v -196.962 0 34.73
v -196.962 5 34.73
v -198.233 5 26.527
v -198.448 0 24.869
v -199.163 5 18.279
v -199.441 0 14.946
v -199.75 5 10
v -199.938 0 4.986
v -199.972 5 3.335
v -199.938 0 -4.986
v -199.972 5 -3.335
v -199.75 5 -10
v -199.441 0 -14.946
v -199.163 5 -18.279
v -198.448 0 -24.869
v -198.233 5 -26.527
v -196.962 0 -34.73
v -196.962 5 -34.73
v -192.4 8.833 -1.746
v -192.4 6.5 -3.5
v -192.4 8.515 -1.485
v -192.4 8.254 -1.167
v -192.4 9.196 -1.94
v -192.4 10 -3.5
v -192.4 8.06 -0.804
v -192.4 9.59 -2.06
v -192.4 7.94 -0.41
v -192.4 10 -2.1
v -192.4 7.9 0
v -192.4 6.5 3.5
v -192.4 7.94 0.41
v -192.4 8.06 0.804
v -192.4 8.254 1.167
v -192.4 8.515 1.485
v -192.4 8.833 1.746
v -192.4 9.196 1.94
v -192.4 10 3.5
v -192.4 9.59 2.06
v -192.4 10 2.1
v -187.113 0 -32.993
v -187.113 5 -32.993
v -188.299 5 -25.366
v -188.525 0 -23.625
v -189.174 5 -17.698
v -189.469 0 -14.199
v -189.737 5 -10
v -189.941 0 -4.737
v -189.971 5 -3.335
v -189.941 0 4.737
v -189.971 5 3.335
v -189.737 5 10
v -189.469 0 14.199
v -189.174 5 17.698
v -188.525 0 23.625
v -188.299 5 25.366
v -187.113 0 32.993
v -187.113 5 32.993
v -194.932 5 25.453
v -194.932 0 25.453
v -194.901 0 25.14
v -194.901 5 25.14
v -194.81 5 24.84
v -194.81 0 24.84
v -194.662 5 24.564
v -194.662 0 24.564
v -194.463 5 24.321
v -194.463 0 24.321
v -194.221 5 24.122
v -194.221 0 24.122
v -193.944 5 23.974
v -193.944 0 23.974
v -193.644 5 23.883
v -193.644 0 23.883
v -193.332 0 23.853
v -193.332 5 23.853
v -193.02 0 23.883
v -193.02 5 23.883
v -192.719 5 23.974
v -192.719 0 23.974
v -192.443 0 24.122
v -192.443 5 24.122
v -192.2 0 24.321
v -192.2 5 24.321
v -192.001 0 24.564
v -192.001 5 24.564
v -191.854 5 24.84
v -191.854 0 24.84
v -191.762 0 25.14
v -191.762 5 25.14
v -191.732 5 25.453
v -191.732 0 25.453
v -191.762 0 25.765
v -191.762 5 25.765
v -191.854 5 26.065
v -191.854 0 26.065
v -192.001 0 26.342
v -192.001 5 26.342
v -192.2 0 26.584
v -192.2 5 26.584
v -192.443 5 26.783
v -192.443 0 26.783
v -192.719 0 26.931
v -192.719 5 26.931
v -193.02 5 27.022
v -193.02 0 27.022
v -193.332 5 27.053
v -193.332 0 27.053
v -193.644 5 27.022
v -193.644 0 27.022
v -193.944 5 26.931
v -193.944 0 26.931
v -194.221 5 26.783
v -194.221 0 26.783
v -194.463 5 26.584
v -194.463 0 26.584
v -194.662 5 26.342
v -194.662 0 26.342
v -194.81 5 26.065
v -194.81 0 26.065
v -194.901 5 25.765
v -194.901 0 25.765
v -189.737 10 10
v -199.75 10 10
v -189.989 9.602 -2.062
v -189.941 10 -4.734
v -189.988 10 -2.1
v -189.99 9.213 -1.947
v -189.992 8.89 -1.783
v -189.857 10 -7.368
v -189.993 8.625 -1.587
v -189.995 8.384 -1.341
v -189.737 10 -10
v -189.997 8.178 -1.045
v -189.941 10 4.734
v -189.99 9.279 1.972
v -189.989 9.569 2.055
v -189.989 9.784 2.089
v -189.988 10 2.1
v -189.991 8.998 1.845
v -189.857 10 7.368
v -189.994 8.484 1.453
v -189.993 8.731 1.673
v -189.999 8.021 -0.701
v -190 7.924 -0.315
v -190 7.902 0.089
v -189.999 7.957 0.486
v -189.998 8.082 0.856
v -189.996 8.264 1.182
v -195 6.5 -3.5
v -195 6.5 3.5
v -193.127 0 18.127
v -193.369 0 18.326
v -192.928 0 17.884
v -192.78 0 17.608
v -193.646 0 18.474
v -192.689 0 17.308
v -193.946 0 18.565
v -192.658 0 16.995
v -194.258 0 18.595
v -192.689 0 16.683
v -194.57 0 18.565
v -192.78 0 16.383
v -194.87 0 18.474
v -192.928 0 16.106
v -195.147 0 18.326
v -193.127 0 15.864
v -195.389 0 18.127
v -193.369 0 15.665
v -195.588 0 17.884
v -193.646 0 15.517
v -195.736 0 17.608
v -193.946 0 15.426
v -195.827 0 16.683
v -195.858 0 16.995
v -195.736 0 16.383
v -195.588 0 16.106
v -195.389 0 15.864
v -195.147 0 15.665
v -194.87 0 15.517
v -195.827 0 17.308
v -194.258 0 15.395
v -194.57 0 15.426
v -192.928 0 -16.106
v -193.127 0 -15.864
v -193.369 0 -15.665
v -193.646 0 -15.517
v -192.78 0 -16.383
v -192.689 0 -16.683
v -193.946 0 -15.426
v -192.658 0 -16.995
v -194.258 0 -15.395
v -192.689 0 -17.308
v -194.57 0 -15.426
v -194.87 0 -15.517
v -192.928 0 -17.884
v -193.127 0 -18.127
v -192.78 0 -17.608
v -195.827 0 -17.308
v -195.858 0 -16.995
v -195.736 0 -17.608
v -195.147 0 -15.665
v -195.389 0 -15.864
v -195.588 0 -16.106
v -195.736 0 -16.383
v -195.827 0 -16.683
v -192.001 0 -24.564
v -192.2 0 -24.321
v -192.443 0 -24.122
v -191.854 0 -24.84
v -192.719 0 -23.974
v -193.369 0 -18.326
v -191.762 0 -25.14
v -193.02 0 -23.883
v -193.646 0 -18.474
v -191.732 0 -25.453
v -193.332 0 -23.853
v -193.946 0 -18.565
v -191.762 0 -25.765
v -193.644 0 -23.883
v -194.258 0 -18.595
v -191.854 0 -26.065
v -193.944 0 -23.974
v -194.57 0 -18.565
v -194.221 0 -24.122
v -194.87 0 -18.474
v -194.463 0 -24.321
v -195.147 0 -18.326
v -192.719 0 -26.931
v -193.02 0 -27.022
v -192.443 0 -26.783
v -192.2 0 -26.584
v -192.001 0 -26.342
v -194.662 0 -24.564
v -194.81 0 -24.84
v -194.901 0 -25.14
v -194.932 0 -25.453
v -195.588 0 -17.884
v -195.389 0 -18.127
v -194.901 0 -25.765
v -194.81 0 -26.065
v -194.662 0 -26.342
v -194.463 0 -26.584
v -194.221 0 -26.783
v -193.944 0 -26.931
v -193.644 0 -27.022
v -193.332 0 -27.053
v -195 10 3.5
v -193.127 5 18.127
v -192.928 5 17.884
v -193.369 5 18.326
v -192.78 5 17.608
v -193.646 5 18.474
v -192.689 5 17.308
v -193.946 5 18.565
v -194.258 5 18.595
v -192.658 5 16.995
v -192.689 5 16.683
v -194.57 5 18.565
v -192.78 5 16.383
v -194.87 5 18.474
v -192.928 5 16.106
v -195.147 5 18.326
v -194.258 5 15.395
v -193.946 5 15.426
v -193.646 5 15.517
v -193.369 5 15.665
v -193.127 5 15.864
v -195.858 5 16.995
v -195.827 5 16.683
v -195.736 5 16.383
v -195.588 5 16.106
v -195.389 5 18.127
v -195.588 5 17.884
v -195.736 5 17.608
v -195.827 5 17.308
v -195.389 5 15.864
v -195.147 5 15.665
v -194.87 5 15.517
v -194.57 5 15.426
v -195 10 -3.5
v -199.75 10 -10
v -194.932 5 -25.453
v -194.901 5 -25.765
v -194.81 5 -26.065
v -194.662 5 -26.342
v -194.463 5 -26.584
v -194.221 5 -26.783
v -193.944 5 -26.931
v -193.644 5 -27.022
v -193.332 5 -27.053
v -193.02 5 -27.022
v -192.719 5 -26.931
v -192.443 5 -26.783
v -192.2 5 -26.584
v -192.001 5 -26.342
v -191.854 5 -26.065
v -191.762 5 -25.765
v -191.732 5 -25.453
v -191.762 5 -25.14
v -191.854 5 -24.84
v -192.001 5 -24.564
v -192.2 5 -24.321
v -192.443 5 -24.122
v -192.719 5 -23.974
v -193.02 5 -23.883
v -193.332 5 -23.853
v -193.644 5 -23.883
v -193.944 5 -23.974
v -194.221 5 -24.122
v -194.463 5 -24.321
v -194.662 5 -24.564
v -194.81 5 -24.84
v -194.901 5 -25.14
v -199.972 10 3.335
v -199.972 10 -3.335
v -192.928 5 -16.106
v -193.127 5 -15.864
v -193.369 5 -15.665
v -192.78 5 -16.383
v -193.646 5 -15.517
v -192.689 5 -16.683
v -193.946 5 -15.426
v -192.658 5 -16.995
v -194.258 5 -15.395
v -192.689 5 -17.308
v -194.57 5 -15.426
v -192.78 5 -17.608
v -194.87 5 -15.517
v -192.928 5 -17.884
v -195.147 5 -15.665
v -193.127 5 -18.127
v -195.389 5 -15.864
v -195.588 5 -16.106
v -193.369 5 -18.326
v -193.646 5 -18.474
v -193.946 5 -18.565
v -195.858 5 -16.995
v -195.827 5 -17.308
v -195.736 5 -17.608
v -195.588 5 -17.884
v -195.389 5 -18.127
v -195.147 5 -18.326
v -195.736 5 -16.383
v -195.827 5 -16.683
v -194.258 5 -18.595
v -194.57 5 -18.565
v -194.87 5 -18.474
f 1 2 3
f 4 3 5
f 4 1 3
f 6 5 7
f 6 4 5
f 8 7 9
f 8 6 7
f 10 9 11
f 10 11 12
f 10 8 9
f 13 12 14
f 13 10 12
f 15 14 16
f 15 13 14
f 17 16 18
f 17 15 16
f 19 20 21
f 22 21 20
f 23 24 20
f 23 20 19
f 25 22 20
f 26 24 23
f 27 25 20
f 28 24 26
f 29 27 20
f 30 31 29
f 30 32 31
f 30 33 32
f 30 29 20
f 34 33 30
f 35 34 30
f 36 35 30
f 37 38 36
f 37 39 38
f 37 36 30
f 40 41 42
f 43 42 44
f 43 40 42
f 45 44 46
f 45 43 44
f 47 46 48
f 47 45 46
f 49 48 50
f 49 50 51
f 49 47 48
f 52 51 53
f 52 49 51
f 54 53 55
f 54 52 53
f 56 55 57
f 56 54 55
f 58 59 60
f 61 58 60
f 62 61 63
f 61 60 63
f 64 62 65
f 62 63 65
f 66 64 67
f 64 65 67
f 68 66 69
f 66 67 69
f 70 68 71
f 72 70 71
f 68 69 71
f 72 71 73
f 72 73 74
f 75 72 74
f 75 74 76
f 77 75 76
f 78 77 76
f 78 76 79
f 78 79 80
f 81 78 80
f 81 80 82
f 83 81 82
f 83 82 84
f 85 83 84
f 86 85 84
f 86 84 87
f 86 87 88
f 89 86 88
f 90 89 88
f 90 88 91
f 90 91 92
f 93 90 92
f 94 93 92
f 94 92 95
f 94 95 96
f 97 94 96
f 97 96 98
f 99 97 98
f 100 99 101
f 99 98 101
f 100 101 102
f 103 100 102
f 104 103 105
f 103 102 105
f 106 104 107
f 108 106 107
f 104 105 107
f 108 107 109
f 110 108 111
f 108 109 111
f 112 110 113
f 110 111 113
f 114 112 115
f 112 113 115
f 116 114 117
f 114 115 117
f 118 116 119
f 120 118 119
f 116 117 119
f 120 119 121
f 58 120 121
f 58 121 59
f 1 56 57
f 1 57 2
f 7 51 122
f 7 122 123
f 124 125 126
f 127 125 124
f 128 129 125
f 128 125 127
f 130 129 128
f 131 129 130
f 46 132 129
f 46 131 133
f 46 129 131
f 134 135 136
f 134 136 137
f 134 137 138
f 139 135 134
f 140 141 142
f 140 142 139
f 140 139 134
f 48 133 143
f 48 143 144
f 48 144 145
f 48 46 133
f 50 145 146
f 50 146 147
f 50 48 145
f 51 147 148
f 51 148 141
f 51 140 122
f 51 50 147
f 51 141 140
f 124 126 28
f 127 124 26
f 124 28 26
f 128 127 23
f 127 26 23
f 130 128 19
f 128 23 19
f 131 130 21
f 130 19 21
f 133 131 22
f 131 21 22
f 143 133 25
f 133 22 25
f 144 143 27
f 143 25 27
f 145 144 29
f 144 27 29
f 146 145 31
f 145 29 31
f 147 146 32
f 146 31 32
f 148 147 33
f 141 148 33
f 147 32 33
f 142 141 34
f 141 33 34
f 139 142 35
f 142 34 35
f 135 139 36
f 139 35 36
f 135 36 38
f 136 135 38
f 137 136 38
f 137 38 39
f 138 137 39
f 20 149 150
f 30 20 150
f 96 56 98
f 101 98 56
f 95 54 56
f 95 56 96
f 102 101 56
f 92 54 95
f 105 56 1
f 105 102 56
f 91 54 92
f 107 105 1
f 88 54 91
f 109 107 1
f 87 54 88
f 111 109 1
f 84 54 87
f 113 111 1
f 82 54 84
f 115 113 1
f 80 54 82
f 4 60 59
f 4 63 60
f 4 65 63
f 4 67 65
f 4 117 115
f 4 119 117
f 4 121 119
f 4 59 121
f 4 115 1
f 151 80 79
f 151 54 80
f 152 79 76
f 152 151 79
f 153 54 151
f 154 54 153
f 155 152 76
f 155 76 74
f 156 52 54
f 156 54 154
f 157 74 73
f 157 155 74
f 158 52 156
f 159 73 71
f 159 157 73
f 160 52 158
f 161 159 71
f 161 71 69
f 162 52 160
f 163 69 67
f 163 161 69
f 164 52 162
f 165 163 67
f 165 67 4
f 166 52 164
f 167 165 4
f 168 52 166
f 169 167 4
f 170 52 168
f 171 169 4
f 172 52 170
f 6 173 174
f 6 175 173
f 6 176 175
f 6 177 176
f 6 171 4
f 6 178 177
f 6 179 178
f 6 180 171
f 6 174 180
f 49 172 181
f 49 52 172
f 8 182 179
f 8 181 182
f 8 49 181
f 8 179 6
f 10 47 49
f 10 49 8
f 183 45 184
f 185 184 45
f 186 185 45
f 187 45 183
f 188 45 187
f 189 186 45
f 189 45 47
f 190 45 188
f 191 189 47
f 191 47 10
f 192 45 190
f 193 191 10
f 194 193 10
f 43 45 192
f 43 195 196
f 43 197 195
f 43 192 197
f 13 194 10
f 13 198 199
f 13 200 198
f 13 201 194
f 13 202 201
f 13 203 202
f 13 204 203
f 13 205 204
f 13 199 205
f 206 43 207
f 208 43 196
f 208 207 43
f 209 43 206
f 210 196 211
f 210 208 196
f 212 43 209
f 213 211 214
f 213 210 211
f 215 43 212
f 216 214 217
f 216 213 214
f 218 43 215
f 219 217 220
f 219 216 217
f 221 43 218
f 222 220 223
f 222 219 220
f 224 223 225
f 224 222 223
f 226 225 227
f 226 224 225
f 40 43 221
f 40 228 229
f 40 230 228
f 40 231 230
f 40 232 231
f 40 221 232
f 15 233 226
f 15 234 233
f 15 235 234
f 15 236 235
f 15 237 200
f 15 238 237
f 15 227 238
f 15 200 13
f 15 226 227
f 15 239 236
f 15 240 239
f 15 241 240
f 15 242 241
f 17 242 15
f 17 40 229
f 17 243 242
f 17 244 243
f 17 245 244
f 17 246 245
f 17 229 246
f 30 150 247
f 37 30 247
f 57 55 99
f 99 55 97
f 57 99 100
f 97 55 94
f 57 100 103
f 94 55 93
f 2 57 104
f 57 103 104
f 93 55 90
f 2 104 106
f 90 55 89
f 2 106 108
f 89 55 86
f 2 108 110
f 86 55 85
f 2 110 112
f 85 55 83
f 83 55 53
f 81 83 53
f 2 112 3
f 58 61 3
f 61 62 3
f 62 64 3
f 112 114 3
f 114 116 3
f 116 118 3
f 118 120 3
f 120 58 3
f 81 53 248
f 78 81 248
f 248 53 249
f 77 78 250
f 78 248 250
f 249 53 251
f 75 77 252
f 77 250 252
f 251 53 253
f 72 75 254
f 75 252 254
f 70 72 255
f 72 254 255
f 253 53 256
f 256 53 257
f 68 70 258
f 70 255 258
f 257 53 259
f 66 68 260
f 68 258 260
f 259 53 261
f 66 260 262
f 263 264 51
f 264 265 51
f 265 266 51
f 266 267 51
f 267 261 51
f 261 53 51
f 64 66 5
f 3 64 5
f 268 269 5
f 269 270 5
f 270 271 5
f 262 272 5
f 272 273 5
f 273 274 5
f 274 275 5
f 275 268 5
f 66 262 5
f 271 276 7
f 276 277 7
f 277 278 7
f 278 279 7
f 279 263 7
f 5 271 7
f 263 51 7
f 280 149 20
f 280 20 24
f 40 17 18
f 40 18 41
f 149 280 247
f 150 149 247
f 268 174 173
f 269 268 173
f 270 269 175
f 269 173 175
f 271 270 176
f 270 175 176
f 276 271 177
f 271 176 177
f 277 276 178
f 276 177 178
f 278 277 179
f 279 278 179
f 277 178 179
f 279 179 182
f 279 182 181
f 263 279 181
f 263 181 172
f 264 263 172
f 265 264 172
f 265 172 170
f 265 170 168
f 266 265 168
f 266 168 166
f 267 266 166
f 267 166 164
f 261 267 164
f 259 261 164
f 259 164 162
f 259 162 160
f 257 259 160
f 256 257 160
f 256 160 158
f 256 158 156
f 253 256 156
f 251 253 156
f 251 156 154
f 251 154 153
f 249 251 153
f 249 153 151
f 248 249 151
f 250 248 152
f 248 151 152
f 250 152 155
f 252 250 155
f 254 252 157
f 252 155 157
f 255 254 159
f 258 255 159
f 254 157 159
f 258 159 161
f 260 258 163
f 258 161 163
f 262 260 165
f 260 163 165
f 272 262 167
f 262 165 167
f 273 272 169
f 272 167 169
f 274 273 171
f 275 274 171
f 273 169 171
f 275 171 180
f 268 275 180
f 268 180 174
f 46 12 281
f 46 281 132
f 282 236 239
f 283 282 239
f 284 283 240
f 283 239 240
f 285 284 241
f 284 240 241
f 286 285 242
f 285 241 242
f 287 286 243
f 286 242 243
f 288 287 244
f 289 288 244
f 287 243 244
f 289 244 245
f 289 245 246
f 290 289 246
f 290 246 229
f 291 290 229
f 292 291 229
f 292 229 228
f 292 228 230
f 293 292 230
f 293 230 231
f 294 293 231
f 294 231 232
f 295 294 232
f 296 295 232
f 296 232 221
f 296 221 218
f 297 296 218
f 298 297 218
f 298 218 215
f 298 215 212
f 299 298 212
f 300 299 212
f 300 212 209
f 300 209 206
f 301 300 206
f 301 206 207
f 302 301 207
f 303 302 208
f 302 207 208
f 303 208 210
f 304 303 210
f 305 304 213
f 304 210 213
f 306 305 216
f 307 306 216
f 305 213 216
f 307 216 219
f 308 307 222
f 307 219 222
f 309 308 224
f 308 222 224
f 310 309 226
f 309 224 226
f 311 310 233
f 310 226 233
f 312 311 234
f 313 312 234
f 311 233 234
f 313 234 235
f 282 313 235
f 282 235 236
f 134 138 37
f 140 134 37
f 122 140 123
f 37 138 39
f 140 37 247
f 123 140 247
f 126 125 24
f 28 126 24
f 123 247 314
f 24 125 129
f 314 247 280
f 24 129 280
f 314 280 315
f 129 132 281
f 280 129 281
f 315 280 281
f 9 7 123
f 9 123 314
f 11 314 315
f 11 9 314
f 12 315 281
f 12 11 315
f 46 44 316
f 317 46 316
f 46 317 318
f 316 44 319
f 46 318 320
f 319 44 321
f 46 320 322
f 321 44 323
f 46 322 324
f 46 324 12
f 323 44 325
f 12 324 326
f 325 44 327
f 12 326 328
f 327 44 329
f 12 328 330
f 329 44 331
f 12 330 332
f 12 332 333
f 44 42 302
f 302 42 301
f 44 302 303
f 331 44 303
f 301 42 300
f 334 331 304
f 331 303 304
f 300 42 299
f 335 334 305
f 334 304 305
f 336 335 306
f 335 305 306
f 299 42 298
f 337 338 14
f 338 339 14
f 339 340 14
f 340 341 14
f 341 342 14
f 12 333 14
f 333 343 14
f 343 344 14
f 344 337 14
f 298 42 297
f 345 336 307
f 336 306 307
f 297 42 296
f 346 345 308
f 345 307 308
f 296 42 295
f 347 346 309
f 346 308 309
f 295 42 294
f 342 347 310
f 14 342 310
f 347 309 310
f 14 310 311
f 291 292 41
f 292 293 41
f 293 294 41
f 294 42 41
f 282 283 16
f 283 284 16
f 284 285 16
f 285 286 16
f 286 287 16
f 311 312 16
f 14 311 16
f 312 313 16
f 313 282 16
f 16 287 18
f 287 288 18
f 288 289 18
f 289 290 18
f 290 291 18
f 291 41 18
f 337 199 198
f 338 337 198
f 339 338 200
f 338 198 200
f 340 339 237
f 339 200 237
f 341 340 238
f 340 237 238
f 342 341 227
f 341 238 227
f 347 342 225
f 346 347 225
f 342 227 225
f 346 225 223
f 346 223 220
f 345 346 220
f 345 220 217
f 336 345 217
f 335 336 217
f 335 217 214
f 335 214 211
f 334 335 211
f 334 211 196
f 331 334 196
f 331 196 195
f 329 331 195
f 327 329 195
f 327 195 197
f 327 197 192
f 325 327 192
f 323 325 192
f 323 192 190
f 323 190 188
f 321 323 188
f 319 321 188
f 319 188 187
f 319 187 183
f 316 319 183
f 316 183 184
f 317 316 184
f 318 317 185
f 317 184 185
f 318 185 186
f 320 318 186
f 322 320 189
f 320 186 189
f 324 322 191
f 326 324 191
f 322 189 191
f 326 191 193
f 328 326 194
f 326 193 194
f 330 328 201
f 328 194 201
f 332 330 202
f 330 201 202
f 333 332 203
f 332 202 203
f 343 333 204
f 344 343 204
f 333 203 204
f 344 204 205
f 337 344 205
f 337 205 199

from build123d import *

# Parameters (mm, degrees)
BOSS_EXTRUDE1_DEPTH        = 5
BOSS_EXTRUDE2_DEPTH        = 5
SKETCH10_W                 = 7
SKETCH10_H                 = 7
CUT_EXTRUDE2_DEPTH         = 2.6
SKETCH11_R                 = 2.1
CUT_EXTRUDE3_DEPTH         = 37.99114612
F_3_2_3_2_DIAMETER_HOLE1_D = 3.2


with BuildPart() as part:
    # Sketch1 → Boss-Extrude1 (new body)
    with BuildSketch(Plane(origin=(0, 0, 0), x_dir=(1, 0, 0), z_dir=(0, 1, 0))):
        with BuildLine():
            Line((-196.961550602, 34.729635533), (-187.113473072, 32.993153757))
            ThreePointArc((-187.113473072, 32.993153757), (-190, 0), (-187.113473072, -32.993153757))
            Line((-187.113473072, -32.993153757), (-196.961550602, -34.729635533))
            ThreePointArc((-196.961550602, -34.729635533), (-200, 0), (-196.961550602, 34.729635533))
        make_face()
    extrude(amount=BOSS_EXTRUDE1_DEPTH)

    # Sketch9 → Boss-Extrude2 (add)
    with BuildSketch(Plane(origin=(0, 5, 0), x_dir=(1, 0, 0), z_dir=(0, 1, 0))):
        with BuildLine():
            Line((-199.749843554, 10), (-189.73665961, 10))
            ThreePointArc((-189.73665961, 10), (-190, 0), (-189.73665961, -10))
            Line((-189.73665961, -10), (-199.749843554, -10))
            ThreePointArc((-199.749843554, -10), (-200, 0), (-199.749843554, 10))
        make_face()
    extrude(amount=BOSS_EXTRUDE2_DEPTH)

    # Sketch10 → Cut-Extrude2 (cut)
    with BuildSketch(Plane.ZY.offset(195)):
        with Locations((0, 10)):
            Rectangle(SKETCH10_W, SKETCH10_H)
    extrude(amount=-CUT_EXTRUDE2_DEPTH, mode=Mode.SUBTRACT)

    # Sketch11 → Cut-Extrude3 (cut, through all)
    with BuildSketch(Plane.ZY.offset(195)):
        with Locations((0, 10)):
            Circle(SKETCH11_R)
    extrude(amount=-CUT_EXTRUDE3_DEPTH, mode=Mode.SUBTRACT)

    # Ø3.2 (3.2) Diameter Hole1 (through all)
    with Locations(Plane(origin=(0, 5, 0), x_dir=(1, 0, 0), z_dir=(0, 1, 0))):
        with Locations((-194.257966128, 16.995369836), (-193.331747968, 25.452607483), (-194.257966128, -16.995369836), (-193.331747968, -25.452607483)):
            Hole(F_3_2_3_2_DIAMETER_HOLE1_D / 2)


solid = part.part
